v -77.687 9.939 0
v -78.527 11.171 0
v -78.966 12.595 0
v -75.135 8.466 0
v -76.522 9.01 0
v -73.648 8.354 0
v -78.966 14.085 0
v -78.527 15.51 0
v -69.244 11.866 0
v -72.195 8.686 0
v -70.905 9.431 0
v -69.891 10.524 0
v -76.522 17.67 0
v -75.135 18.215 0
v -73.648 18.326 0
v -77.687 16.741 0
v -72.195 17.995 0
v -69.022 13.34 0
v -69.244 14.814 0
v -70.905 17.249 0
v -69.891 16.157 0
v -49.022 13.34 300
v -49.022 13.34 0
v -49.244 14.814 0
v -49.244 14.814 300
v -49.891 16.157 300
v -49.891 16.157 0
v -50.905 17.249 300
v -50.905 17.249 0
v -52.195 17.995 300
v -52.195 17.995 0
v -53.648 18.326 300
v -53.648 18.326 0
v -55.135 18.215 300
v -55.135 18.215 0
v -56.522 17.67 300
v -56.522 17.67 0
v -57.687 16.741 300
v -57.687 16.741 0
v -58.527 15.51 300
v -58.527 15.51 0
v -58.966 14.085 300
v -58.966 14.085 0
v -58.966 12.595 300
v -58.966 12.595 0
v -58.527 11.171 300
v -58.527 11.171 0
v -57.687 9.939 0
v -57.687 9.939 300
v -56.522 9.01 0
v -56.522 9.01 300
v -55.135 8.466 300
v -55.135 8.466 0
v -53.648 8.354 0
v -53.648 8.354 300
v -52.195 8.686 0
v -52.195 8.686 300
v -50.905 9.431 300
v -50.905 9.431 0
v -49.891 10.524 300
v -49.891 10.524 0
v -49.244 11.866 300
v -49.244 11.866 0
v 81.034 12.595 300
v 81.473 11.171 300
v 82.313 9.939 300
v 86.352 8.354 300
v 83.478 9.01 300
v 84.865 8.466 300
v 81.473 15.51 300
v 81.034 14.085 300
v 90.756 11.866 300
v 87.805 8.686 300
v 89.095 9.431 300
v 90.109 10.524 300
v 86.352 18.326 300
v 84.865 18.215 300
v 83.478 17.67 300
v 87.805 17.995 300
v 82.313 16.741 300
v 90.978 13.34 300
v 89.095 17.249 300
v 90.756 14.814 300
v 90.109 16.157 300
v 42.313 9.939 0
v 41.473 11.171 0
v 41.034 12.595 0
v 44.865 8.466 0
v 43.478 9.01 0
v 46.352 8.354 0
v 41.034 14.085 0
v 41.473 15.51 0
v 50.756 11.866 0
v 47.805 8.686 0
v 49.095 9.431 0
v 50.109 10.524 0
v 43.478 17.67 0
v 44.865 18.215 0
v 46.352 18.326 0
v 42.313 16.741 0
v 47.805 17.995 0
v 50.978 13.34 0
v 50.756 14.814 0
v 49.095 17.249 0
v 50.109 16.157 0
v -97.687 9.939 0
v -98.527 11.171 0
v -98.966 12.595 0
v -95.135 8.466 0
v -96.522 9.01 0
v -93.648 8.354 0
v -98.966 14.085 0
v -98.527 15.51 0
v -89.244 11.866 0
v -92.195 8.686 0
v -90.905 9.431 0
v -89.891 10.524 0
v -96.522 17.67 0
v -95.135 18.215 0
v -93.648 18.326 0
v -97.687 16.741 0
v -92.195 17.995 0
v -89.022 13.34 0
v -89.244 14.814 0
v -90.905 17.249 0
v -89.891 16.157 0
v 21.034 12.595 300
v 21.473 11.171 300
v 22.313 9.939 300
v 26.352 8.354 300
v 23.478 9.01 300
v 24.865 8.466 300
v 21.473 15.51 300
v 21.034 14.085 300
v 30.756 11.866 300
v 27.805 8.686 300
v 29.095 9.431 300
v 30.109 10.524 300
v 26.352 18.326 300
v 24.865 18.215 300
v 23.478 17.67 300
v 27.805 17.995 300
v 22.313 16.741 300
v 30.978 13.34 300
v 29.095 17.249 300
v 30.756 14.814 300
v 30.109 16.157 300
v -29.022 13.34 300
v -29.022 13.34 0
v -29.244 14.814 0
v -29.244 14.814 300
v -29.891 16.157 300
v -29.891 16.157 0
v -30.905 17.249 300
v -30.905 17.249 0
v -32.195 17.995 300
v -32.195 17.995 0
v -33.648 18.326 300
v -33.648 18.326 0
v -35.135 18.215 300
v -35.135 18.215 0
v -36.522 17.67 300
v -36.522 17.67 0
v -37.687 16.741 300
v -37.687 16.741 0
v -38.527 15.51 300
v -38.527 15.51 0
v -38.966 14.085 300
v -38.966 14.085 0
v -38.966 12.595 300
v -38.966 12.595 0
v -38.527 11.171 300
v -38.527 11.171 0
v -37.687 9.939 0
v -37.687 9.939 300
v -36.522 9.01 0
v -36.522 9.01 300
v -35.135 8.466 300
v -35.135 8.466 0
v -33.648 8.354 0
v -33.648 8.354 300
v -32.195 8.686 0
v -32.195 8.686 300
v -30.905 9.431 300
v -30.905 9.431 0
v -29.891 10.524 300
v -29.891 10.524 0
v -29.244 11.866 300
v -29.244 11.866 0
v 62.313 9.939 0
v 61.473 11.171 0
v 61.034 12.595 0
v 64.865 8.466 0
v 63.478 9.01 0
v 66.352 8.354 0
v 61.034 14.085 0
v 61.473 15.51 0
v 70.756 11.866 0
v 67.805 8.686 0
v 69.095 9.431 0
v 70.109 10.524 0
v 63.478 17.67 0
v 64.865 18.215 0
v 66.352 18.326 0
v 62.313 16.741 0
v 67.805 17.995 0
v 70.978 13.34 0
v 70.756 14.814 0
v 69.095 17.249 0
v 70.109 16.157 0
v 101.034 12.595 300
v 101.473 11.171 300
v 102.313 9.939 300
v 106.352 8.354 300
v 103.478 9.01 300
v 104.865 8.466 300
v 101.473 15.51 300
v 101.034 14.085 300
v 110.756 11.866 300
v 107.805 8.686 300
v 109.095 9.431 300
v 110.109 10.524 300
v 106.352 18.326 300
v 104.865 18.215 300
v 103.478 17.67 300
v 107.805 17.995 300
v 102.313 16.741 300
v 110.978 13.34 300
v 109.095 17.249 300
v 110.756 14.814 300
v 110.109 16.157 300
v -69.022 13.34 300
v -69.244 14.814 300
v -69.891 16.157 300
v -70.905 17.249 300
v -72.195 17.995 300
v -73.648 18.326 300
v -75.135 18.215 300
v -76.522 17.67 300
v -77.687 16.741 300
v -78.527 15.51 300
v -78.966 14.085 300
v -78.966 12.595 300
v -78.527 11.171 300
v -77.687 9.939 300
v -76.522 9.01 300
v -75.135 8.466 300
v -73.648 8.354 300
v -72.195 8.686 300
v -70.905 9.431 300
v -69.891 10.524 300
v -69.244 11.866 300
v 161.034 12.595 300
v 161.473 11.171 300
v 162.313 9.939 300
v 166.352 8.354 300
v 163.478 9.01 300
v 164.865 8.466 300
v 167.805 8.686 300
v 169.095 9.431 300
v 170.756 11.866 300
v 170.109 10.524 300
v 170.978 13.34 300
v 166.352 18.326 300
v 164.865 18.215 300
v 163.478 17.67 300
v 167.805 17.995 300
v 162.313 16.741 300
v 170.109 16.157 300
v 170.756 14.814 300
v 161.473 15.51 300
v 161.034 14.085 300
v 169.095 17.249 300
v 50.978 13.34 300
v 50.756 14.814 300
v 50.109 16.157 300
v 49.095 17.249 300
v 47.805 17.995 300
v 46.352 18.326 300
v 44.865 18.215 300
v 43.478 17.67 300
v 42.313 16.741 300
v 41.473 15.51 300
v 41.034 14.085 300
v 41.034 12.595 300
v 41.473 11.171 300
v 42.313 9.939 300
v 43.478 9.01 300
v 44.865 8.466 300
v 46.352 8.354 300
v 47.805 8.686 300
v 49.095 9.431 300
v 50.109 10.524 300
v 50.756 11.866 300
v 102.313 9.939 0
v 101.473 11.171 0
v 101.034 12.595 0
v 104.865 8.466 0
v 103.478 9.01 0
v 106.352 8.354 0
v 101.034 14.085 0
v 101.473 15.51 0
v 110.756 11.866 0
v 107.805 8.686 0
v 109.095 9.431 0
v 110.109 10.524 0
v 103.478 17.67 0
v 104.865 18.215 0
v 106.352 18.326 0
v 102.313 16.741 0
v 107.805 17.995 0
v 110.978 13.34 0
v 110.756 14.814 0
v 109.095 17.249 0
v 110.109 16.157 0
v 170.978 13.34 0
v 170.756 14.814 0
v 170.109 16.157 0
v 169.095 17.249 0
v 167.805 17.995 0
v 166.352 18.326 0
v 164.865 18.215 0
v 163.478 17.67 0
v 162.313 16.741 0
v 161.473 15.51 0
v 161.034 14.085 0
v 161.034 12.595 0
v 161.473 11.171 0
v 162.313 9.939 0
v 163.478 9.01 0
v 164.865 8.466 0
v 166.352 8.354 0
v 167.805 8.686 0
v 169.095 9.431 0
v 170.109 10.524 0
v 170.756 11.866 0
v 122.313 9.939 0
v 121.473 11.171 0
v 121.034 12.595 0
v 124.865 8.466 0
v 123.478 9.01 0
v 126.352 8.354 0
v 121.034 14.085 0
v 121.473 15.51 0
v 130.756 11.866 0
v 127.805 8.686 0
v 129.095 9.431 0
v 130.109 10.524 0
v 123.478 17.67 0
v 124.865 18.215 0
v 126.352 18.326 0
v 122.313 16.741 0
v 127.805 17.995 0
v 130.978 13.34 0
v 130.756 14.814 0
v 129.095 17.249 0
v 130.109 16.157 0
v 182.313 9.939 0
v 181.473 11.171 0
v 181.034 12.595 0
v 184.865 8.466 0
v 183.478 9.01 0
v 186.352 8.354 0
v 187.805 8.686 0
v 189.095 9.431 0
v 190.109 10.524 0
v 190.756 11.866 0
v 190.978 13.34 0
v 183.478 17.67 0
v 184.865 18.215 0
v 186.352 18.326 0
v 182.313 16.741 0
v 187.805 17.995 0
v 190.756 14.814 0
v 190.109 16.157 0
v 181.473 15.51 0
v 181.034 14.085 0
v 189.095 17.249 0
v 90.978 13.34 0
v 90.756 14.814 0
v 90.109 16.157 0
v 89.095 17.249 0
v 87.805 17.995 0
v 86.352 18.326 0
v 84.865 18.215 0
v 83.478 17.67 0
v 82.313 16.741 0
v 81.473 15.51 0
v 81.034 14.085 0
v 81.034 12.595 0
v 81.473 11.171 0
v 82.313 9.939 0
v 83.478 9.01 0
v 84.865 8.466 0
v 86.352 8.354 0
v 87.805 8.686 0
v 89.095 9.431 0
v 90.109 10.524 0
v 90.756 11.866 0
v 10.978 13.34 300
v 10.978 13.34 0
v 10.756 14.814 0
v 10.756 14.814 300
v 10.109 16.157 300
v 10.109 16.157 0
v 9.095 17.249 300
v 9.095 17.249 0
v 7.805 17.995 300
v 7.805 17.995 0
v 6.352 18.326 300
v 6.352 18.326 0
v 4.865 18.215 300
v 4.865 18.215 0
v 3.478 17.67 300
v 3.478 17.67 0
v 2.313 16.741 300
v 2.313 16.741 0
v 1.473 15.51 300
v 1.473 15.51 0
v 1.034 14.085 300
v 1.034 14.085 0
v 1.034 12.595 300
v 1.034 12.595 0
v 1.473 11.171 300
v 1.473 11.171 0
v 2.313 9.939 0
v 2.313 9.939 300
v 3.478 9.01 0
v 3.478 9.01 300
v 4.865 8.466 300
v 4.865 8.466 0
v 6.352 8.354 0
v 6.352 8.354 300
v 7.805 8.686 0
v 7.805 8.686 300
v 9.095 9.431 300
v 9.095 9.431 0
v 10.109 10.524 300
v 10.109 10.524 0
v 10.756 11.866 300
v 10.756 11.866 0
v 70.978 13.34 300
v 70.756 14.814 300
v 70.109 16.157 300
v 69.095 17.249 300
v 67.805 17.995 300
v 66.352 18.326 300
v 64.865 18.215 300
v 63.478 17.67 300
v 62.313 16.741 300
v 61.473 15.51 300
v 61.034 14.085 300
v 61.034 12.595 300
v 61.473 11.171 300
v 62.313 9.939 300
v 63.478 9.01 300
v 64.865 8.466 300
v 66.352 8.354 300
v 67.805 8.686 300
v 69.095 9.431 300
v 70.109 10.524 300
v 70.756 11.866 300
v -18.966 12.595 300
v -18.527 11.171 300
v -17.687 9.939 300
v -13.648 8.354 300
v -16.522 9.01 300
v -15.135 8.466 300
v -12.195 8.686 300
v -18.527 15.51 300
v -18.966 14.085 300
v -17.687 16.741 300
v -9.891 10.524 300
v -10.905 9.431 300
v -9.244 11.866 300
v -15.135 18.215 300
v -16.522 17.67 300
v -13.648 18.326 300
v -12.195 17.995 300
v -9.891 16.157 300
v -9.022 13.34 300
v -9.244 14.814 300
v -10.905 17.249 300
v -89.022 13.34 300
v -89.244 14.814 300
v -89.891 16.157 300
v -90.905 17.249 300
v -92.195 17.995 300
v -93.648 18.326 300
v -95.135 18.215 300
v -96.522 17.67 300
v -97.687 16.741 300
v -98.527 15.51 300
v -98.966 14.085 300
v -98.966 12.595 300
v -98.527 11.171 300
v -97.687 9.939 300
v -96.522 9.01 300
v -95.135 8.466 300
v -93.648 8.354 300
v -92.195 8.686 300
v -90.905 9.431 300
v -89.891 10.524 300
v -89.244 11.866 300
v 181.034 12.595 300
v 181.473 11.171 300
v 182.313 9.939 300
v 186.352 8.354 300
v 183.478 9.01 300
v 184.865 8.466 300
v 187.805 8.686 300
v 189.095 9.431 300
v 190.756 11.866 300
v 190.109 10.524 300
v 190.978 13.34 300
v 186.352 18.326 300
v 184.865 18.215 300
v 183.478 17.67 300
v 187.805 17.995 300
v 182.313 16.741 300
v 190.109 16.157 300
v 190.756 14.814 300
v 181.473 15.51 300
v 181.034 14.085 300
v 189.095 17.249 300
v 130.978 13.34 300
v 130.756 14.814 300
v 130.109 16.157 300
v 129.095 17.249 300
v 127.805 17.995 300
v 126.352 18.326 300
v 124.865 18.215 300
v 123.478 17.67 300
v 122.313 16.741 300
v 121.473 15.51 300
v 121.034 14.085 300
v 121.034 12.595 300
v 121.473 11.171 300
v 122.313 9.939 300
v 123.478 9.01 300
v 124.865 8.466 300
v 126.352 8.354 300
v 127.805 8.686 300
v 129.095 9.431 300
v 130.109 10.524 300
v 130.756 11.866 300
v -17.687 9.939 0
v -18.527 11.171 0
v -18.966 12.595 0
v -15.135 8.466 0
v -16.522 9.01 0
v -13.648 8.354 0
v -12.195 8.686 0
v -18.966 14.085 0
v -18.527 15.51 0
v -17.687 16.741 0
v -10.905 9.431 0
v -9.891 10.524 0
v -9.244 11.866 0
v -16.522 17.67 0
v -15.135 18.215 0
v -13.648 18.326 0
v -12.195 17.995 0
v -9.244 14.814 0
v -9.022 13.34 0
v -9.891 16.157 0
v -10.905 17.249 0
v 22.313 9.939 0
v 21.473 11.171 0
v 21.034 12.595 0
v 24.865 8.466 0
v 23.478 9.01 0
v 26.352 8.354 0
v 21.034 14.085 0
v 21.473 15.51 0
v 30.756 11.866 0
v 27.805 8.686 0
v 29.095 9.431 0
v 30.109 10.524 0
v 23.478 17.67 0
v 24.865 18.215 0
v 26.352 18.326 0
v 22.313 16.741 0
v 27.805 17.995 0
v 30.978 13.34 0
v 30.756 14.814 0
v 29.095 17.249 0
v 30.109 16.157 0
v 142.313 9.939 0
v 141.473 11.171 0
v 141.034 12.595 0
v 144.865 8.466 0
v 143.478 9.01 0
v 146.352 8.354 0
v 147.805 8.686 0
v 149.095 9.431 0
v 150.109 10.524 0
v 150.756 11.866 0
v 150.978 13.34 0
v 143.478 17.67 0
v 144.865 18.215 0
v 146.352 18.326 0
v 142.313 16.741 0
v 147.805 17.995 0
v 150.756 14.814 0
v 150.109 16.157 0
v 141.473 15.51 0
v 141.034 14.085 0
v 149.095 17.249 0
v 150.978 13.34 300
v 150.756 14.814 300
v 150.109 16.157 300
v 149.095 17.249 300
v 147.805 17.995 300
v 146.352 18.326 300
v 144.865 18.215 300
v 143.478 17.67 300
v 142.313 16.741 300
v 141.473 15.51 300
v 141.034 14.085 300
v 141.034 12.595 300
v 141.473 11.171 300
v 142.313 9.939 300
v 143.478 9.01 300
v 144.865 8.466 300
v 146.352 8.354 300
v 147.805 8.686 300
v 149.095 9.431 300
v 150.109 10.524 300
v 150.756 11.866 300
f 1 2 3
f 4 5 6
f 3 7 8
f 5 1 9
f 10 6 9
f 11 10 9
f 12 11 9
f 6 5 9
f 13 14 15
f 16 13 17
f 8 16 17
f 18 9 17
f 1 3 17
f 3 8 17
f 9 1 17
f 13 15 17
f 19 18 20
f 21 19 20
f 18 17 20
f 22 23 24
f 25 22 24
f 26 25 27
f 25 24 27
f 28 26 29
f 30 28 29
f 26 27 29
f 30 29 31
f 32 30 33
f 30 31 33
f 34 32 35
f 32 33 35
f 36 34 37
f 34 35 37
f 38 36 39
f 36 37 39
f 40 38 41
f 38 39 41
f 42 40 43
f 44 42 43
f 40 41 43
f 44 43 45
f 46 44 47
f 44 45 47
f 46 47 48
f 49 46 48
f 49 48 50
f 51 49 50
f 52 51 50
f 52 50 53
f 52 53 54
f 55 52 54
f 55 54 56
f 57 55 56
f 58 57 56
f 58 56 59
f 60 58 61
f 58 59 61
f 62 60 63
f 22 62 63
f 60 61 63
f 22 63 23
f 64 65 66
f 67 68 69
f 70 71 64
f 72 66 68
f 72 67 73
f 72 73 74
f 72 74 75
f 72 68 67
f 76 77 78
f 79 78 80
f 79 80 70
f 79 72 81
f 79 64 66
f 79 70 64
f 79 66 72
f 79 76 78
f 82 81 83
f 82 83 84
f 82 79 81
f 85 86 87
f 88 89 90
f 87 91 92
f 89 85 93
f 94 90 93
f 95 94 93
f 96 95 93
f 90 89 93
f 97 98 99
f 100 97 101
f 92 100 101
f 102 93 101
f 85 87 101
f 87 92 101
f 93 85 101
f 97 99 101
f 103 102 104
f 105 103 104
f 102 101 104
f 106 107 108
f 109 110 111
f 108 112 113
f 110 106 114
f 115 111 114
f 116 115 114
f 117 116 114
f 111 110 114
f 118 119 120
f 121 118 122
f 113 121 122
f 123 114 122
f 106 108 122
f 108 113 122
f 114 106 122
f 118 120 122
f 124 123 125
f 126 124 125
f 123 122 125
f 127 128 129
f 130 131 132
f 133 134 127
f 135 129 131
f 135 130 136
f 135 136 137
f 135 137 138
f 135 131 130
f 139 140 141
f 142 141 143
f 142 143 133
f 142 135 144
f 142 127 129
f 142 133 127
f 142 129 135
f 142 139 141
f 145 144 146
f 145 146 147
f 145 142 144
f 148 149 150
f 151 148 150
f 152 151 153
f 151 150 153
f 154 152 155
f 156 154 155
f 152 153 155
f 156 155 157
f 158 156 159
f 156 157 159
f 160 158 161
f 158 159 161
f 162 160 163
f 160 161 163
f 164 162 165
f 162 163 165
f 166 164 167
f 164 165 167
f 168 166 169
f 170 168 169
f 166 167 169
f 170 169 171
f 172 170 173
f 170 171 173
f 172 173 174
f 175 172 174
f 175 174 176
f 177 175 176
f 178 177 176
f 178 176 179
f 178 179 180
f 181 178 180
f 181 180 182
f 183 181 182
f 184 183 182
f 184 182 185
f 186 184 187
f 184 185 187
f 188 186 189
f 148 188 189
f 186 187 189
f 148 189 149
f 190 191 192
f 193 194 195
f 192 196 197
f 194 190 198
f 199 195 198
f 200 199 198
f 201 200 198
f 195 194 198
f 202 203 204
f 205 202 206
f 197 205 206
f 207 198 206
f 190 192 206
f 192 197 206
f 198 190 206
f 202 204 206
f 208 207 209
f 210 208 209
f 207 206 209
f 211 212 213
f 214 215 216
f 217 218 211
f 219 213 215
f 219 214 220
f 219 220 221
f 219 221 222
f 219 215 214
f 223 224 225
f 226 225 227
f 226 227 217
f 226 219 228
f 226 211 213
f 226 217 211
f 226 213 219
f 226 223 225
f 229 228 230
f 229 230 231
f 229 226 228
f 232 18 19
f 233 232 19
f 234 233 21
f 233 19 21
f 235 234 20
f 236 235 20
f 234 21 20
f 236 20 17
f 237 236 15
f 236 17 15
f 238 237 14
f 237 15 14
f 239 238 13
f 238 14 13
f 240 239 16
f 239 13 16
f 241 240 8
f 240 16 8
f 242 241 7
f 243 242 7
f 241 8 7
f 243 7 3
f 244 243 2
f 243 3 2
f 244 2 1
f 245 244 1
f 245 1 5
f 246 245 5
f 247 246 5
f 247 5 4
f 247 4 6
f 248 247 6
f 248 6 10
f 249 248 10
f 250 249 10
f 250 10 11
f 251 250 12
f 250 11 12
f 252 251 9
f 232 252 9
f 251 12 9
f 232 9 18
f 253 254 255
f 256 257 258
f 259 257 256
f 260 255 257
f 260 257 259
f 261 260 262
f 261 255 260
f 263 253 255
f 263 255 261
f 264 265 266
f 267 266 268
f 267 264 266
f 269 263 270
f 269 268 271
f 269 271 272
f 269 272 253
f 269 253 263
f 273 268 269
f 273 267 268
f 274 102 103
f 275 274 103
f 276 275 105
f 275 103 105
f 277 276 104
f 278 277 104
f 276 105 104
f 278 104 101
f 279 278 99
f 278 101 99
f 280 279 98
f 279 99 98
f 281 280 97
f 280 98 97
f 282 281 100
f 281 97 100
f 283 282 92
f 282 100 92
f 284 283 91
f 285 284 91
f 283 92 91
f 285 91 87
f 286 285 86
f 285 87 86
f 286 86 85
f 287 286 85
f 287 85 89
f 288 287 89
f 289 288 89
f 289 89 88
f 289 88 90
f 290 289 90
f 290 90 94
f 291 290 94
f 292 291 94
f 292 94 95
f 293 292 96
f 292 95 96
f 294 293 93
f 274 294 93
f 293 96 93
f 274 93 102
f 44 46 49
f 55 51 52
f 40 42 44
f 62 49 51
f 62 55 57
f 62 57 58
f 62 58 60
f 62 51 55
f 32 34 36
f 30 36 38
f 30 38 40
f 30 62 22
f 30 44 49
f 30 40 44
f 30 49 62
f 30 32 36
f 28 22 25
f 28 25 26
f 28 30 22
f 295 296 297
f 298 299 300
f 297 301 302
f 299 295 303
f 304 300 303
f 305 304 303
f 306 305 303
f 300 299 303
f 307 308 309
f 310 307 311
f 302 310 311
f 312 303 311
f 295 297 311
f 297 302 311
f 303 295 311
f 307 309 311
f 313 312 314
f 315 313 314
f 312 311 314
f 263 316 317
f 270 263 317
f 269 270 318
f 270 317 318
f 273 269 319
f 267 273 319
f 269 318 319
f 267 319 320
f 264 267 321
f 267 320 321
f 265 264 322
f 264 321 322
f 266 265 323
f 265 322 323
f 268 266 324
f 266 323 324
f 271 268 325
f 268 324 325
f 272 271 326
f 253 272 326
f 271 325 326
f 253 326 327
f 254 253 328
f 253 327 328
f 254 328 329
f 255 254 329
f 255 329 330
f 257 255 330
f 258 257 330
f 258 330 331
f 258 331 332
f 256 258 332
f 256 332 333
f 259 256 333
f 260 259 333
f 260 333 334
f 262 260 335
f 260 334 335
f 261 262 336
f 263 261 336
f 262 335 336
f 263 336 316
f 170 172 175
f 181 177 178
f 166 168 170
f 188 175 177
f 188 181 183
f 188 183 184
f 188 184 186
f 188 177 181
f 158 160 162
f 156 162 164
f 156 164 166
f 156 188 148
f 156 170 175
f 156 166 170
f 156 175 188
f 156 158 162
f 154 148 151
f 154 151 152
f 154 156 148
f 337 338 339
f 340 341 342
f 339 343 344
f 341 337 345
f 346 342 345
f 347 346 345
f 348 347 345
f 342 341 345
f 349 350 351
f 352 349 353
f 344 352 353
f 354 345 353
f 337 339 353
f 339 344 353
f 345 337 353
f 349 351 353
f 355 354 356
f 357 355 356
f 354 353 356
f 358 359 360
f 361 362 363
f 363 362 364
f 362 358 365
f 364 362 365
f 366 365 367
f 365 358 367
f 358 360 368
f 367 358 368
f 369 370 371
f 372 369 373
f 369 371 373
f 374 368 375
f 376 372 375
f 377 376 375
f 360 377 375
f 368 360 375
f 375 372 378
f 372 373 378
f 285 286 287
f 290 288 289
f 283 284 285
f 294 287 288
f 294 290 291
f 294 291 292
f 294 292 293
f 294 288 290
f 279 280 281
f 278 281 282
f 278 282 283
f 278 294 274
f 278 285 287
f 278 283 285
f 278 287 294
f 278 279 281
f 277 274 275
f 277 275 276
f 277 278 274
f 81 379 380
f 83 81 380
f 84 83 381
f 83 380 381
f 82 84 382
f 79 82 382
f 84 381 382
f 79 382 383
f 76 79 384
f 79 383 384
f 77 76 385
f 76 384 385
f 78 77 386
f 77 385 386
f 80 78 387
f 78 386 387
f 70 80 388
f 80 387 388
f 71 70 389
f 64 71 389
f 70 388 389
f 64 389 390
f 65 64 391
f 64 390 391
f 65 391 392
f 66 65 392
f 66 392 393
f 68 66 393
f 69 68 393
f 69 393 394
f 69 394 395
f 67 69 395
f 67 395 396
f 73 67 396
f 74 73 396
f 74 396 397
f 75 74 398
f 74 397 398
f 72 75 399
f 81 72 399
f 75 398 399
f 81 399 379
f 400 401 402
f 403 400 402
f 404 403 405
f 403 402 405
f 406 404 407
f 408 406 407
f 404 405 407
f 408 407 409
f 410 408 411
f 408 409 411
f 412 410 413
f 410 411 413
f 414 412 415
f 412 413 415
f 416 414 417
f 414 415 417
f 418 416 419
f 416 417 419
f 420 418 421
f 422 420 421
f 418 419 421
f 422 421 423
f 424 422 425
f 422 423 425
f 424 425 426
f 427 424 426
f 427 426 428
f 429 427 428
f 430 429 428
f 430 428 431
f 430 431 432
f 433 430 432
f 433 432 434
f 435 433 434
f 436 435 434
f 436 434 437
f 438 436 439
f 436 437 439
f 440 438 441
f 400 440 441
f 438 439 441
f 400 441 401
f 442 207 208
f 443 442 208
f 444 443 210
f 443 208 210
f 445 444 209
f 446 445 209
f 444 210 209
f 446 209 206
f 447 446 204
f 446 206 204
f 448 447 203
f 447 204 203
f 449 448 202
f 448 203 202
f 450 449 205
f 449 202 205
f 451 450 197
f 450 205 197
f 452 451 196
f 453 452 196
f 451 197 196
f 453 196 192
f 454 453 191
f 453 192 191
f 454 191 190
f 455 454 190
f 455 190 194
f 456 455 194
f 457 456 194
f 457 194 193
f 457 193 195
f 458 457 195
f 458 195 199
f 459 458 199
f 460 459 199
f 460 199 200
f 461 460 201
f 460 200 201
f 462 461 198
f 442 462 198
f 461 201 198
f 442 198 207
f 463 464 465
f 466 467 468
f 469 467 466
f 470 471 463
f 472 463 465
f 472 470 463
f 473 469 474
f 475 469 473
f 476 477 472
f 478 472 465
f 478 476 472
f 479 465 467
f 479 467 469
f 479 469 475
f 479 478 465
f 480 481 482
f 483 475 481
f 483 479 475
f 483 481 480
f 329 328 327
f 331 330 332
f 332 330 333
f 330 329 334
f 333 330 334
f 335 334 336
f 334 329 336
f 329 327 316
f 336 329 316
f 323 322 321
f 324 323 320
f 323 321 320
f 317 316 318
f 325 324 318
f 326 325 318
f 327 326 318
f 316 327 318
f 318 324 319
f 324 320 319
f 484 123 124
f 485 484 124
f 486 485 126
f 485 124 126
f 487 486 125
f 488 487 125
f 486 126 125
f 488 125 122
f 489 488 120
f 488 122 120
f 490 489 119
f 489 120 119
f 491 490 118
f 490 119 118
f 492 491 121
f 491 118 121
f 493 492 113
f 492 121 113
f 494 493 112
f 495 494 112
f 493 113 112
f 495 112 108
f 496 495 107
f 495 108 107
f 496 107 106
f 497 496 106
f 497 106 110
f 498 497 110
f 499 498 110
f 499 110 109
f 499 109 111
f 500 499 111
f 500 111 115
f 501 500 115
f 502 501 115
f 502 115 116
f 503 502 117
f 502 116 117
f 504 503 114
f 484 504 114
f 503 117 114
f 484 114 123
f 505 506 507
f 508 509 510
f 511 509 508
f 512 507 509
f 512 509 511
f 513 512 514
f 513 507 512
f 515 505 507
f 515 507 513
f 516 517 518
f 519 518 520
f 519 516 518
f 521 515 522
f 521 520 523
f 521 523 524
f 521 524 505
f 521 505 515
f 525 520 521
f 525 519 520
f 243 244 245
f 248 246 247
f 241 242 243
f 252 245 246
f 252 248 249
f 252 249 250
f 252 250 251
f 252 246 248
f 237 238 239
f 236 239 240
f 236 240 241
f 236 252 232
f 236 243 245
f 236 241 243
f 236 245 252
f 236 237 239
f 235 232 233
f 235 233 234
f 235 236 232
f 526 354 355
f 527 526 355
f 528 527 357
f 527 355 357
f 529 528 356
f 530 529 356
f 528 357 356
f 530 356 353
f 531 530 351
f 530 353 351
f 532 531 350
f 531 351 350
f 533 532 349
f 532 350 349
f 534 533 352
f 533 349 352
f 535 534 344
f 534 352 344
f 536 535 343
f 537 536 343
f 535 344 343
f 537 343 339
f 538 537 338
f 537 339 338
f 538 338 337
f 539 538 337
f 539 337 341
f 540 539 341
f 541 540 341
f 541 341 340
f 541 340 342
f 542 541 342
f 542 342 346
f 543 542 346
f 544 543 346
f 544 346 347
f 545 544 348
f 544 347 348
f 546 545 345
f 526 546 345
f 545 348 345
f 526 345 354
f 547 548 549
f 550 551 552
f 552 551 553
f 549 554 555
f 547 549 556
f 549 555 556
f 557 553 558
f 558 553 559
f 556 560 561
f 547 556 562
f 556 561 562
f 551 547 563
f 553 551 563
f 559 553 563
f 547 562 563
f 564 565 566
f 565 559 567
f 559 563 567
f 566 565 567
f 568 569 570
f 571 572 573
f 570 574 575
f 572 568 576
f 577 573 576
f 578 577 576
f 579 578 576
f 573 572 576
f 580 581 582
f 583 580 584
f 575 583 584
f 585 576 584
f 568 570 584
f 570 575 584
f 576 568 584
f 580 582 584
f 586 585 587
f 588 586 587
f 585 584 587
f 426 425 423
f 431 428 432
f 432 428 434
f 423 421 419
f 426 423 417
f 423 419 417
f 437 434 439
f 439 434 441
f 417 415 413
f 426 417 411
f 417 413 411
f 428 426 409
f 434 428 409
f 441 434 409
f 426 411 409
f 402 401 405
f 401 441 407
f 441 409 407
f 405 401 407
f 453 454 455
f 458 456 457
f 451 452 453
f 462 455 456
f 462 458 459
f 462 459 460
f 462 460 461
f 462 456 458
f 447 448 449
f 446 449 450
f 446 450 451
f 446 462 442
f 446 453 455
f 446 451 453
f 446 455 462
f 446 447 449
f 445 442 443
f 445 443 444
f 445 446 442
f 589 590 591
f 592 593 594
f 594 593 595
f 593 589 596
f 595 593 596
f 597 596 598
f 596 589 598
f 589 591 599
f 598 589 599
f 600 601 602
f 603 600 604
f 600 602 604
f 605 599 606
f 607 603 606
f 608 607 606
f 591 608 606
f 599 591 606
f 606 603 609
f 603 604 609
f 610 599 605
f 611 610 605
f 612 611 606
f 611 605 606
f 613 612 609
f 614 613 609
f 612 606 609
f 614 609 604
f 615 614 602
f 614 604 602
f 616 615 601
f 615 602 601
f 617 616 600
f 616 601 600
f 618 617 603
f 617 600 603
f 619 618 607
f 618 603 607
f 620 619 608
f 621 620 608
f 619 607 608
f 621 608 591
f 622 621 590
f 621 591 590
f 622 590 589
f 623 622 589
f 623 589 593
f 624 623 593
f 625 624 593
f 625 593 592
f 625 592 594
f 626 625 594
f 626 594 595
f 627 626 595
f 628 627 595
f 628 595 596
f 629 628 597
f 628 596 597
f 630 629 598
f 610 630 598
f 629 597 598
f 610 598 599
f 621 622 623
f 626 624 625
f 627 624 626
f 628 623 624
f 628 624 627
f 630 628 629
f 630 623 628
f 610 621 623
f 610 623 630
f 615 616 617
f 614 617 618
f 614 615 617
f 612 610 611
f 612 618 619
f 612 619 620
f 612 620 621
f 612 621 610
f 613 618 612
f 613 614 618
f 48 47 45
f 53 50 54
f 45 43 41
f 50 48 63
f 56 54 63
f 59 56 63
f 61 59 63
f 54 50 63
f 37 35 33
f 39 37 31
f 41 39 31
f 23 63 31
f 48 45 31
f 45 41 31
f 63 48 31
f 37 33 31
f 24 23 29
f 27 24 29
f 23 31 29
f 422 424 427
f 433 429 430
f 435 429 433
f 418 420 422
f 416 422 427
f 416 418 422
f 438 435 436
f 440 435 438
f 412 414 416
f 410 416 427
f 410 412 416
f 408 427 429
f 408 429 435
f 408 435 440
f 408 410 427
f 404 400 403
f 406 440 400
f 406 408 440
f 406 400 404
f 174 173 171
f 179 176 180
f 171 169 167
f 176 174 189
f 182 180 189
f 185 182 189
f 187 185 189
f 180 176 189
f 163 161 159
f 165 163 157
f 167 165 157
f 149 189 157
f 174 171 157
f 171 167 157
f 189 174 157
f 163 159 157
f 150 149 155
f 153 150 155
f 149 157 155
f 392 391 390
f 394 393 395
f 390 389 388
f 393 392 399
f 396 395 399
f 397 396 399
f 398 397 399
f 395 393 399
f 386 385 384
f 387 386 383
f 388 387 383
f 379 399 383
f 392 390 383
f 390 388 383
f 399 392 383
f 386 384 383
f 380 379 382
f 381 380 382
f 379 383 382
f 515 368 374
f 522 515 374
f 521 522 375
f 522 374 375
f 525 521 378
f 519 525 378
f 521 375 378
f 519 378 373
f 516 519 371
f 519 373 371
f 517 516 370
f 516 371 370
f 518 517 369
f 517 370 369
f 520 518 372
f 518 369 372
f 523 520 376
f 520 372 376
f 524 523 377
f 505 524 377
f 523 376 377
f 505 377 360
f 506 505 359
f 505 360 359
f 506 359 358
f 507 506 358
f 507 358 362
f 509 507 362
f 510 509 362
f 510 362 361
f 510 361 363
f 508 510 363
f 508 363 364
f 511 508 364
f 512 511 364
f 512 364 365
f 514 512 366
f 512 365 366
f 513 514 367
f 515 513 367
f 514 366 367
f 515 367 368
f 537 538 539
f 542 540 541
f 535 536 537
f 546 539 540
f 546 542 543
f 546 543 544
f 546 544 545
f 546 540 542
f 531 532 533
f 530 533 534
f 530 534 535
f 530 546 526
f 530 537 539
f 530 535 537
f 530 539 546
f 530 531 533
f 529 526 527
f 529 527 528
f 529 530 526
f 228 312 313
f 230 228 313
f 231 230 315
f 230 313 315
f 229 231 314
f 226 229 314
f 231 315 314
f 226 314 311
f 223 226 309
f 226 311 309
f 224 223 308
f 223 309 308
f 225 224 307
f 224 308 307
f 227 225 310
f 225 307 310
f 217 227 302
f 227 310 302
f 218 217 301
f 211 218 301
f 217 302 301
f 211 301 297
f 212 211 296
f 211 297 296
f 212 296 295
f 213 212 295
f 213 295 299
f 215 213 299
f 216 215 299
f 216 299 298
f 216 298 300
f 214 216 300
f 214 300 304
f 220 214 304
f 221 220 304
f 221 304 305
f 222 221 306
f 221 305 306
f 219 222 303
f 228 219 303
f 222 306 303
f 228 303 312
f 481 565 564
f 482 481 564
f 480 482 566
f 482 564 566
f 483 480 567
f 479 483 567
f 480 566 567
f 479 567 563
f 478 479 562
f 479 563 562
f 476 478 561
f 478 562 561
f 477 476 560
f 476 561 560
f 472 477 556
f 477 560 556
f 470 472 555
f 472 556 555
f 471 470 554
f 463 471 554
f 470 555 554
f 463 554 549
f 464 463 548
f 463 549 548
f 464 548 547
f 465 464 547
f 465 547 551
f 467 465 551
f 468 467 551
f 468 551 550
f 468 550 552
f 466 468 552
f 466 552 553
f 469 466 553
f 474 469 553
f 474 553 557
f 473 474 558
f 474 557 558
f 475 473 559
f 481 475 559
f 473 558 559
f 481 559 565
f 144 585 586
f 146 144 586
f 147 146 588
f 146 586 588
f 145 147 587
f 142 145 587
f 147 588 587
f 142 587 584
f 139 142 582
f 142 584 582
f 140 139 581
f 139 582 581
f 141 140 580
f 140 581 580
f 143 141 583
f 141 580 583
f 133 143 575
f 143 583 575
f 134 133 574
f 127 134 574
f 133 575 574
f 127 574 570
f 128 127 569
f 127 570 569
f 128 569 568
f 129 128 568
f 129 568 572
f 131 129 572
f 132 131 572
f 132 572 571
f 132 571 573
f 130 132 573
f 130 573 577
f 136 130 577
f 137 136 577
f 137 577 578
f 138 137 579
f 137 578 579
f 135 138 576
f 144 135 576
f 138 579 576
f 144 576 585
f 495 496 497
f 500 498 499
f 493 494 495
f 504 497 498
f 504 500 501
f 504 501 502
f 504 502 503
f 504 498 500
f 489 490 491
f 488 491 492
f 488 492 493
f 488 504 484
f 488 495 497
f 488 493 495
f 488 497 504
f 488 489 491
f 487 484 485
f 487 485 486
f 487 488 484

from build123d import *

# Parameters (mm, degrees)
F0_R     = 5
F1_DEPTH = 300


with BuildPart() as f1:
    # F0 (on Top) → F1 (new body)
    with BuildSketch(Plane.XY):
        with Locations((-94.022136, 13.340164)):
            Circle(F0_R)
        with Locations((-74.022136, 13.340164)):
            Circle(F0_R)
        with Locations((-54.022136, 13.340164)):
            Circle(F0_R)
        with Locations((-34.022132, 13.340164)):
            Circle(F0_R)
        with Locations((-14.022132, 13.340164)):
            Circle(F0_R)
        with Locations((5.977868, 13.340164)):
            Circle(F0_R)
        with Locations((25.977868, 13.340164)):
            Circle(F0_R)
        with Locations((45.977868, 13.340164)):
            Circle(F0_R)
        with Locations((65.977868, 13.340164)):
            Circle(F0_R)
        with Locations((85.977868, 13.340164)):
            Circle(F0_R)
        with Locations((105.977868, 13.340164)):
            Circle(F0_R)
        with Locations((125.977868, 13.340164)):
            Circle(F0_R)
        with Locations((145.977868, 13.340164)):
            Circle(F0_R)
        with Locations((165.977868, 13.340164)):
            Circle(F0_R)
        with Locations((185.977868, 13.340164)):
            Circle(F0_R)
    extrude(amount=F1_DEPTH)


solid = f1.part
